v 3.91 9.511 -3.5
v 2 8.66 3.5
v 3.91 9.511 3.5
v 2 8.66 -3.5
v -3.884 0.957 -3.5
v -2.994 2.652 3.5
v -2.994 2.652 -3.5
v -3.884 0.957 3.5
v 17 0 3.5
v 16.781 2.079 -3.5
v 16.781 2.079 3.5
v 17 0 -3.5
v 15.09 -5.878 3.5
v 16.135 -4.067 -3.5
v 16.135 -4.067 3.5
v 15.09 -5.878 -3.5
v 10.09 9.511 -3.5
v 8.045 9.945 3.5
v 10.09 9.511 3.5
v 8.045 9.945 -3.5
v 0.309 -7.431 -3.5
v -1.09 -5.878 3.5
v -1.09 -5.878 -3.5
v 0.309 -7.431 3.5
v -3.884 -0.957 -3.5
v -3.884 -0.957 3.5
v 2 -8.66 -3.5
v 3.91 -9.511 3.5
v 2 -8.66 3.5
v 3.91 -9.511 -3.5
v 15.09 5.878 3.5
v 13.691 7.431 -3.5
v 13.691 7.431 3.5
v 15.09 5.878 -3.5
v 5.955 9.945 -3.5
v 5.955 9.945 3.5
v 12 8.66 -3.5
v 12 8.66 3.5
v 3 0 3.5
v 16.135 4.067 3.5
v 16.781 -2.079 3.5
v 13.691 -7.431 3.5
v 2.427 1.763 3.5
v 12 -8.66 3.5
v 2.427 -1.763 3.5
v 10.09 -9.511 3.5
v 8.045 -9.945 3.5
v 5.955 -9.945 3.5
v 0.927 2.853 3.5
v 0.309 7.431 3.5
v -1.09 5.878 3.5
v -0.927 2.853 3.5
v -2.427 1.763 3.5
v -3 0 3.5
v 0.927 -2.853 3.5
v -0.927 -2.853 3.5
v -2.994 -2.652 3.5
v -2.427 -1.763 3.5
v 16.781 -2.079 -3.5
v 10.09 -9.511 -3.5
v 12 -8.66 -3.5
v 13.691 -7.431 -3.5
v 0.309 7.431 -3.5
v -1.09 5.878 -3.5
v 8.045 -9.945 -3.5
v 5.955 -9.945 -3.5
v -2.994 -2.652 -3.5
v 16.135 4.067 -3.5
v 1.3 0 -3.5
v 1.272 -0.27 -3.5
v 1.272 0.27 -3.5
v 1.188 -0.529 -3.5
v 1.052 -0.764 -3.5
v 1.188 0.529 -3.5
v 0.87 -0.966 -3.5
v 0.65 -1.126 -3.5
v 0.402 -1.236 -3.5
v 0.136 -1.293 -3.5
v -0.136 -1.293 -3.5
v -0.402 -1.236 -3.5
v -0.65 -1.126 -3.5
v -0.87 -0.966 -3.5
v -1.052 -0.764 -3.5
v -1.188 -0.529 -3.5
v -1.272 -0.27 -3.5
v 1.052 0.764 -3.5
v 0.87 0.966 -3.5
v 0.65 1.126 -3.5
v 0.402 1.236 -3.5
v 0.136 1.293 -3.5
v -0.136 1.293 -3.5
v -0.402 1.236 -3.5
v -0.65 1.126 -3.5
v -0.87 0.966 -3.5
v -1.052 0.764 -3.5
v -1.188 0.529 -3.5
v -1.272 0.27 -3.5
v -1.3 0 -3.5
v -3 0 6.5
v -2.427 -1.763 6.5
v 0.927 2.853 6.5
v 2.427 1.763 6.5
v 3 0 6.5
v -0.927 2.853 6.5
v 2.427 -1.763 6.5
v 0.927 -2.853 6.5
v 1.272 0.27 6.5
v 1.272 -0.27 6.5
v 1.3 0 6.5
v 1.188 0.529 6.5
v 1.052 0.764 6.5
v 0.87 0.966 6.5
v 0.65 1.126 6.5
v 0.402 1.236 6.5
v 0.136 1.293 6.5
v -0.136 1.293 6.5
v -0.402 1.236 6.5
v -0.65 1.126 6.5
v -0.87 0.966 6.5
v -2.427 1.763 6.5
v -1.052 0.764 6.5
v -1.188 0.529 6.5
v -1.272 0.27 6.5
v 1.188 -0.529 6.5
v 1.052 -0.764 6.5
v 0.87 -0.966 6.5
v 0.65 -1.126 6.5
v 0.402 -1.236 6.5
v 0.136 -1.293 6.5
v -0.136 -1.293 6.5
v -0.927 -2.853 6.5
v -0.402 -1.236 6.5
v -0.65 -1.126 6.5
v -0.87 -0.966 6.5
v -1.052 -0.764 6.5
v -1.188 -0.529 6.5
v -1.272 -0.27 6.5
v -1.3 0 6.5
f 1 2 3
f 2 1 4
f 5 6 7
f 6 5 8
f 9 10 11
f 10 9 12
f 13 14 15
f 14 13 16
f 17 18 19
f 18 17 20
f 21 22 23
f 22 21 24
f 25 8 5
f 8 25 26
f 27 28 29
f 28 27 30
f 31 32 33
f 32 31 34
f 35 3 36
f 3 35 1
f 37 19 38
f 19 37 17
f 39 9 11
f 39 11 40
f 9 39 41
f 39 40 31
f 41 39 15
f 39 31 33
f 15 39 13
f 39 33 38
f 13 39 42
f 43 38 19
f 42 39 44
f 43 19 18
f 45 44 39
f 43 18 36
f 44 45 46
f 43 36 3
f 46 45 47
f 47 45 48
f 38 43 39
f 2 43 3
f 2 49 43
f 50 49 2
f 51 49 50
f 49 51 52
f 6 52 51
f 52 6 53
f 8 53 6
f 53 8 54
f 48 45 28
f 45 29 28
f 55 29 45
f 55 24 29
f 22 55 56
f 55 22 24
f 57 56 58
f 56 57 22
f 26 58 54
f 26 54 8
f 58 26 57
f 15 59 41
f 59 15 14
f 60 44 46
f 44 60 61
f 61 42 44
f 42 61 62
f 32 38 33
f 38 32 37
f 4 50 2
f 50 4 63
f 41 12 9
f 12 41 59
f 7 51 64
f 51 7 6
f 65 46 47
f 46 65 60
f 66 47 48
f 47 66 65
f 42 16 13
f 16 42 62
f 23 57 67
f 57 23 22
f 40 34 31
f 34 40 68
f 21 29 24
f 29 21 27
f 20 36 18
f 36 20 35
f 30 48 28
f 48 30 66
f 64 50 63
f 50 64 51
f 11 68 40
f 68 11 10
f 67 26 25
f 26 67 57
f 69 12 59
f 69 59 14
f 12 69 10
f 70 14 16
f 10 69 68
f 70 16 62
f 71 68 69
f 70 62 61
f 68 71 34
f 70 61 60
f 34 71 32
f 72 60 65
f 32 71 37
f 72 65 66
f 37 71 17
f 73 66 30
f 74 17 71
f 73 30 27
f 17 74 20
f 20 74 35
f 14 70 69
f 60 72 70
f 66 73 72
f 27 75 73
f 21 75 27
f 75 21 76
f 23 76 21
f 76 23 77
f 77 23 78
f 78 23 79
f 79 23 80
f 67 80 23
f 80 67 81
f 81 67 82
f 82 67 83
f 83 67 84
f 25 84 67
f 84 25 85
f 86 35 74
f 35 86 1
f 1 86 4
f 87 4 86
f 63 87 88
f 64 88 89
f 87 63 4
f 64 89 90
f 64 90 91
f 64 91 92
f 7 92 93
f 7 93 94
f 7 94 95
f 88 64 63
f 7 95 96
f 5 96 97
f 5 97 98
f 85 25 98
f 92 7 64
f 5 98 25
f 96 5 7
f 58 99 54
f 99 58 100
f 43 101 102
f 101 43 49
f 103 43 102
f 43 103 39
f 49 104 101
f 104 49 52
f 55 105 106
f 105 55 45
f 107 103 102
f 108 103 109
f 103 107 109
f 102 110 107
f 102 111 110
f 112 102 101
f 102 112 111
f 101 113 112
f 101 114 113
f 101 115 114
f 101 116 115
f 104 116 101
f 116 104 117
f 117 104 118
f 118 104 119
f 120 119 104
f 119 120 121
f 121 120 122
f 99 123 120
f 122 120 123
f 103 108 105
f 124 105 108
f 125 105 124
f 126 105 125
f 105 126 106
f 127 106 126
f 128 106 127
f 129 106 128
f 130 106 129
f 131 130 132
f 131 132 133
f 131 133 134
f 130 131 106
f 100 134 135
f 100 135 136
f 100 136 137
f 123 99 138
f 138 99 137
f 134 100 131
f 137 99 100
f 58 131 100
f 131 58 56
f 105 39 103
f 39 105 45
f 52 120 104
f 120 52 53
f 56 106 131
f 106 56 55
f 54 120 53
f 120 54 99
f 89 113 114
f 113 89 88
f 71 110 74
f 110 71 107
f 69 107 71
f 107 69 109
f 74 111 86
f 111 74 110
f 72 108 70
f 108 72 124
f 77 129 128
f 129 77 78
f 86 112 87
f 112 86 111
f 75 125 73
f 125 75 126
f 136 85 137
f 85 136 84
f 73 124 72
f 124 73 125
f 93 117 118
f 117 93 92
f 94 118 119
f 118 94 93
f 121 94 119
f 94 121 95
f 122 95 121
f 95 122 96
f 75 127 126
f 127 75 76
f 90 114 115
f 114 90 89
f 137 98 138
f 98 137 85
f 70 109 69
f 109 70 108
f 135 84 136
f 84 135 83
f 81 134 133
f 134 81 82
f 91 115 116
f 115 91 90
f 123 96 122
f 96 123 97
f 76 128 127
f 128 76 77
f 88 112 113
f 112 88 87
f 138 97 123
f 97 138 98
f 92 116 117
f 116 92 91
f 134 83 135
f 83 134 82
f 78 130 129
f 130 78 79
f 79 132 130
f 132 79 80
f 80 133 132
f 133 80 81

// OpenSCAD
//Vibration Mass (round type)
//CudaTox (@cudatox) 2017

/*

Copyright 2017 Cudatox

Redistribution and use in source and binary forms, with or without modification, are permitted provided that the following conditions are met:

1. Redistributions of source code must retain the above copyright notice, this list of conditions and the following disclaimer.

2. Redistributions in binary form must reproduce the above copyright notice, this list of conditions and the following disclaimer in the documentation and/or other materials provided with the distribution.

THIS SOFTWARE IS PROVIDED BY THE COPYRIGHT HOLDERS AND CONTRIBUTORS "AS IS" AND ANY EXPRESS OR IMPLIED WARRANTIES, INCLUDING, BUT NOT LIMITED TO, THE IMPLIED WARRANTIES OF MERCHANTABILITY AND FITNESS FOR A PARTICULAR PURPOSE ARE DISCLAIMED. IN NO EVENT SHALL THE COPYRIGHT HOLDER OR CONTRIBUTORS BE LIABLE FOR ANY DIRECT, INDIRECT, INCIDENTAL, SPECIAL, EXEMPLARY, OR CONSEQUENTIAL DAMAGES (INCLUDING, BUT NOT LIMITED TO, PROCUREMENT OF SUBSTITUTE GOODS OR SERVICES; LOSS OF USE, DATA, OR PROFITS; OR BUSINESS INTERRUPTION) HOWEVER CAUSED AND ON ANY THEORY OF LIABILITY, WHETHER IN CONTRACT, STRICT LIABILITY, OR TORT (INCLUDING NEGLIGENCE OR OTHERWISE) ARISING IN ANY WAY OUT OF THE USE OF THIS SOFTWARE, EVEN IF ADVISED OF THE POSSIBILITY OF SUCH DAMAGE.

*/

thickness = 7;
d1 = 8;
d2 = 20;
spacing = 7;
shaft_dia = 2.6;
shaft_od = 6;
shaft_len = 3;

difference(){
    union(){
        hull(){
            cylinder(h=thickness, d=d1, center=true);
            translate([spacing,0,0])
            cylinder(h=thickness, d=d2, center=true);
        }
        translate([0,0,shaft_len/2 + thickness/2])
        cylinder(h=shaft_len, d=shaft_od, center=true);
    }
    cylinder(h=(thickness + shaft_len) * 2, d=shaft_dia, center=true,$fn=30);
}
